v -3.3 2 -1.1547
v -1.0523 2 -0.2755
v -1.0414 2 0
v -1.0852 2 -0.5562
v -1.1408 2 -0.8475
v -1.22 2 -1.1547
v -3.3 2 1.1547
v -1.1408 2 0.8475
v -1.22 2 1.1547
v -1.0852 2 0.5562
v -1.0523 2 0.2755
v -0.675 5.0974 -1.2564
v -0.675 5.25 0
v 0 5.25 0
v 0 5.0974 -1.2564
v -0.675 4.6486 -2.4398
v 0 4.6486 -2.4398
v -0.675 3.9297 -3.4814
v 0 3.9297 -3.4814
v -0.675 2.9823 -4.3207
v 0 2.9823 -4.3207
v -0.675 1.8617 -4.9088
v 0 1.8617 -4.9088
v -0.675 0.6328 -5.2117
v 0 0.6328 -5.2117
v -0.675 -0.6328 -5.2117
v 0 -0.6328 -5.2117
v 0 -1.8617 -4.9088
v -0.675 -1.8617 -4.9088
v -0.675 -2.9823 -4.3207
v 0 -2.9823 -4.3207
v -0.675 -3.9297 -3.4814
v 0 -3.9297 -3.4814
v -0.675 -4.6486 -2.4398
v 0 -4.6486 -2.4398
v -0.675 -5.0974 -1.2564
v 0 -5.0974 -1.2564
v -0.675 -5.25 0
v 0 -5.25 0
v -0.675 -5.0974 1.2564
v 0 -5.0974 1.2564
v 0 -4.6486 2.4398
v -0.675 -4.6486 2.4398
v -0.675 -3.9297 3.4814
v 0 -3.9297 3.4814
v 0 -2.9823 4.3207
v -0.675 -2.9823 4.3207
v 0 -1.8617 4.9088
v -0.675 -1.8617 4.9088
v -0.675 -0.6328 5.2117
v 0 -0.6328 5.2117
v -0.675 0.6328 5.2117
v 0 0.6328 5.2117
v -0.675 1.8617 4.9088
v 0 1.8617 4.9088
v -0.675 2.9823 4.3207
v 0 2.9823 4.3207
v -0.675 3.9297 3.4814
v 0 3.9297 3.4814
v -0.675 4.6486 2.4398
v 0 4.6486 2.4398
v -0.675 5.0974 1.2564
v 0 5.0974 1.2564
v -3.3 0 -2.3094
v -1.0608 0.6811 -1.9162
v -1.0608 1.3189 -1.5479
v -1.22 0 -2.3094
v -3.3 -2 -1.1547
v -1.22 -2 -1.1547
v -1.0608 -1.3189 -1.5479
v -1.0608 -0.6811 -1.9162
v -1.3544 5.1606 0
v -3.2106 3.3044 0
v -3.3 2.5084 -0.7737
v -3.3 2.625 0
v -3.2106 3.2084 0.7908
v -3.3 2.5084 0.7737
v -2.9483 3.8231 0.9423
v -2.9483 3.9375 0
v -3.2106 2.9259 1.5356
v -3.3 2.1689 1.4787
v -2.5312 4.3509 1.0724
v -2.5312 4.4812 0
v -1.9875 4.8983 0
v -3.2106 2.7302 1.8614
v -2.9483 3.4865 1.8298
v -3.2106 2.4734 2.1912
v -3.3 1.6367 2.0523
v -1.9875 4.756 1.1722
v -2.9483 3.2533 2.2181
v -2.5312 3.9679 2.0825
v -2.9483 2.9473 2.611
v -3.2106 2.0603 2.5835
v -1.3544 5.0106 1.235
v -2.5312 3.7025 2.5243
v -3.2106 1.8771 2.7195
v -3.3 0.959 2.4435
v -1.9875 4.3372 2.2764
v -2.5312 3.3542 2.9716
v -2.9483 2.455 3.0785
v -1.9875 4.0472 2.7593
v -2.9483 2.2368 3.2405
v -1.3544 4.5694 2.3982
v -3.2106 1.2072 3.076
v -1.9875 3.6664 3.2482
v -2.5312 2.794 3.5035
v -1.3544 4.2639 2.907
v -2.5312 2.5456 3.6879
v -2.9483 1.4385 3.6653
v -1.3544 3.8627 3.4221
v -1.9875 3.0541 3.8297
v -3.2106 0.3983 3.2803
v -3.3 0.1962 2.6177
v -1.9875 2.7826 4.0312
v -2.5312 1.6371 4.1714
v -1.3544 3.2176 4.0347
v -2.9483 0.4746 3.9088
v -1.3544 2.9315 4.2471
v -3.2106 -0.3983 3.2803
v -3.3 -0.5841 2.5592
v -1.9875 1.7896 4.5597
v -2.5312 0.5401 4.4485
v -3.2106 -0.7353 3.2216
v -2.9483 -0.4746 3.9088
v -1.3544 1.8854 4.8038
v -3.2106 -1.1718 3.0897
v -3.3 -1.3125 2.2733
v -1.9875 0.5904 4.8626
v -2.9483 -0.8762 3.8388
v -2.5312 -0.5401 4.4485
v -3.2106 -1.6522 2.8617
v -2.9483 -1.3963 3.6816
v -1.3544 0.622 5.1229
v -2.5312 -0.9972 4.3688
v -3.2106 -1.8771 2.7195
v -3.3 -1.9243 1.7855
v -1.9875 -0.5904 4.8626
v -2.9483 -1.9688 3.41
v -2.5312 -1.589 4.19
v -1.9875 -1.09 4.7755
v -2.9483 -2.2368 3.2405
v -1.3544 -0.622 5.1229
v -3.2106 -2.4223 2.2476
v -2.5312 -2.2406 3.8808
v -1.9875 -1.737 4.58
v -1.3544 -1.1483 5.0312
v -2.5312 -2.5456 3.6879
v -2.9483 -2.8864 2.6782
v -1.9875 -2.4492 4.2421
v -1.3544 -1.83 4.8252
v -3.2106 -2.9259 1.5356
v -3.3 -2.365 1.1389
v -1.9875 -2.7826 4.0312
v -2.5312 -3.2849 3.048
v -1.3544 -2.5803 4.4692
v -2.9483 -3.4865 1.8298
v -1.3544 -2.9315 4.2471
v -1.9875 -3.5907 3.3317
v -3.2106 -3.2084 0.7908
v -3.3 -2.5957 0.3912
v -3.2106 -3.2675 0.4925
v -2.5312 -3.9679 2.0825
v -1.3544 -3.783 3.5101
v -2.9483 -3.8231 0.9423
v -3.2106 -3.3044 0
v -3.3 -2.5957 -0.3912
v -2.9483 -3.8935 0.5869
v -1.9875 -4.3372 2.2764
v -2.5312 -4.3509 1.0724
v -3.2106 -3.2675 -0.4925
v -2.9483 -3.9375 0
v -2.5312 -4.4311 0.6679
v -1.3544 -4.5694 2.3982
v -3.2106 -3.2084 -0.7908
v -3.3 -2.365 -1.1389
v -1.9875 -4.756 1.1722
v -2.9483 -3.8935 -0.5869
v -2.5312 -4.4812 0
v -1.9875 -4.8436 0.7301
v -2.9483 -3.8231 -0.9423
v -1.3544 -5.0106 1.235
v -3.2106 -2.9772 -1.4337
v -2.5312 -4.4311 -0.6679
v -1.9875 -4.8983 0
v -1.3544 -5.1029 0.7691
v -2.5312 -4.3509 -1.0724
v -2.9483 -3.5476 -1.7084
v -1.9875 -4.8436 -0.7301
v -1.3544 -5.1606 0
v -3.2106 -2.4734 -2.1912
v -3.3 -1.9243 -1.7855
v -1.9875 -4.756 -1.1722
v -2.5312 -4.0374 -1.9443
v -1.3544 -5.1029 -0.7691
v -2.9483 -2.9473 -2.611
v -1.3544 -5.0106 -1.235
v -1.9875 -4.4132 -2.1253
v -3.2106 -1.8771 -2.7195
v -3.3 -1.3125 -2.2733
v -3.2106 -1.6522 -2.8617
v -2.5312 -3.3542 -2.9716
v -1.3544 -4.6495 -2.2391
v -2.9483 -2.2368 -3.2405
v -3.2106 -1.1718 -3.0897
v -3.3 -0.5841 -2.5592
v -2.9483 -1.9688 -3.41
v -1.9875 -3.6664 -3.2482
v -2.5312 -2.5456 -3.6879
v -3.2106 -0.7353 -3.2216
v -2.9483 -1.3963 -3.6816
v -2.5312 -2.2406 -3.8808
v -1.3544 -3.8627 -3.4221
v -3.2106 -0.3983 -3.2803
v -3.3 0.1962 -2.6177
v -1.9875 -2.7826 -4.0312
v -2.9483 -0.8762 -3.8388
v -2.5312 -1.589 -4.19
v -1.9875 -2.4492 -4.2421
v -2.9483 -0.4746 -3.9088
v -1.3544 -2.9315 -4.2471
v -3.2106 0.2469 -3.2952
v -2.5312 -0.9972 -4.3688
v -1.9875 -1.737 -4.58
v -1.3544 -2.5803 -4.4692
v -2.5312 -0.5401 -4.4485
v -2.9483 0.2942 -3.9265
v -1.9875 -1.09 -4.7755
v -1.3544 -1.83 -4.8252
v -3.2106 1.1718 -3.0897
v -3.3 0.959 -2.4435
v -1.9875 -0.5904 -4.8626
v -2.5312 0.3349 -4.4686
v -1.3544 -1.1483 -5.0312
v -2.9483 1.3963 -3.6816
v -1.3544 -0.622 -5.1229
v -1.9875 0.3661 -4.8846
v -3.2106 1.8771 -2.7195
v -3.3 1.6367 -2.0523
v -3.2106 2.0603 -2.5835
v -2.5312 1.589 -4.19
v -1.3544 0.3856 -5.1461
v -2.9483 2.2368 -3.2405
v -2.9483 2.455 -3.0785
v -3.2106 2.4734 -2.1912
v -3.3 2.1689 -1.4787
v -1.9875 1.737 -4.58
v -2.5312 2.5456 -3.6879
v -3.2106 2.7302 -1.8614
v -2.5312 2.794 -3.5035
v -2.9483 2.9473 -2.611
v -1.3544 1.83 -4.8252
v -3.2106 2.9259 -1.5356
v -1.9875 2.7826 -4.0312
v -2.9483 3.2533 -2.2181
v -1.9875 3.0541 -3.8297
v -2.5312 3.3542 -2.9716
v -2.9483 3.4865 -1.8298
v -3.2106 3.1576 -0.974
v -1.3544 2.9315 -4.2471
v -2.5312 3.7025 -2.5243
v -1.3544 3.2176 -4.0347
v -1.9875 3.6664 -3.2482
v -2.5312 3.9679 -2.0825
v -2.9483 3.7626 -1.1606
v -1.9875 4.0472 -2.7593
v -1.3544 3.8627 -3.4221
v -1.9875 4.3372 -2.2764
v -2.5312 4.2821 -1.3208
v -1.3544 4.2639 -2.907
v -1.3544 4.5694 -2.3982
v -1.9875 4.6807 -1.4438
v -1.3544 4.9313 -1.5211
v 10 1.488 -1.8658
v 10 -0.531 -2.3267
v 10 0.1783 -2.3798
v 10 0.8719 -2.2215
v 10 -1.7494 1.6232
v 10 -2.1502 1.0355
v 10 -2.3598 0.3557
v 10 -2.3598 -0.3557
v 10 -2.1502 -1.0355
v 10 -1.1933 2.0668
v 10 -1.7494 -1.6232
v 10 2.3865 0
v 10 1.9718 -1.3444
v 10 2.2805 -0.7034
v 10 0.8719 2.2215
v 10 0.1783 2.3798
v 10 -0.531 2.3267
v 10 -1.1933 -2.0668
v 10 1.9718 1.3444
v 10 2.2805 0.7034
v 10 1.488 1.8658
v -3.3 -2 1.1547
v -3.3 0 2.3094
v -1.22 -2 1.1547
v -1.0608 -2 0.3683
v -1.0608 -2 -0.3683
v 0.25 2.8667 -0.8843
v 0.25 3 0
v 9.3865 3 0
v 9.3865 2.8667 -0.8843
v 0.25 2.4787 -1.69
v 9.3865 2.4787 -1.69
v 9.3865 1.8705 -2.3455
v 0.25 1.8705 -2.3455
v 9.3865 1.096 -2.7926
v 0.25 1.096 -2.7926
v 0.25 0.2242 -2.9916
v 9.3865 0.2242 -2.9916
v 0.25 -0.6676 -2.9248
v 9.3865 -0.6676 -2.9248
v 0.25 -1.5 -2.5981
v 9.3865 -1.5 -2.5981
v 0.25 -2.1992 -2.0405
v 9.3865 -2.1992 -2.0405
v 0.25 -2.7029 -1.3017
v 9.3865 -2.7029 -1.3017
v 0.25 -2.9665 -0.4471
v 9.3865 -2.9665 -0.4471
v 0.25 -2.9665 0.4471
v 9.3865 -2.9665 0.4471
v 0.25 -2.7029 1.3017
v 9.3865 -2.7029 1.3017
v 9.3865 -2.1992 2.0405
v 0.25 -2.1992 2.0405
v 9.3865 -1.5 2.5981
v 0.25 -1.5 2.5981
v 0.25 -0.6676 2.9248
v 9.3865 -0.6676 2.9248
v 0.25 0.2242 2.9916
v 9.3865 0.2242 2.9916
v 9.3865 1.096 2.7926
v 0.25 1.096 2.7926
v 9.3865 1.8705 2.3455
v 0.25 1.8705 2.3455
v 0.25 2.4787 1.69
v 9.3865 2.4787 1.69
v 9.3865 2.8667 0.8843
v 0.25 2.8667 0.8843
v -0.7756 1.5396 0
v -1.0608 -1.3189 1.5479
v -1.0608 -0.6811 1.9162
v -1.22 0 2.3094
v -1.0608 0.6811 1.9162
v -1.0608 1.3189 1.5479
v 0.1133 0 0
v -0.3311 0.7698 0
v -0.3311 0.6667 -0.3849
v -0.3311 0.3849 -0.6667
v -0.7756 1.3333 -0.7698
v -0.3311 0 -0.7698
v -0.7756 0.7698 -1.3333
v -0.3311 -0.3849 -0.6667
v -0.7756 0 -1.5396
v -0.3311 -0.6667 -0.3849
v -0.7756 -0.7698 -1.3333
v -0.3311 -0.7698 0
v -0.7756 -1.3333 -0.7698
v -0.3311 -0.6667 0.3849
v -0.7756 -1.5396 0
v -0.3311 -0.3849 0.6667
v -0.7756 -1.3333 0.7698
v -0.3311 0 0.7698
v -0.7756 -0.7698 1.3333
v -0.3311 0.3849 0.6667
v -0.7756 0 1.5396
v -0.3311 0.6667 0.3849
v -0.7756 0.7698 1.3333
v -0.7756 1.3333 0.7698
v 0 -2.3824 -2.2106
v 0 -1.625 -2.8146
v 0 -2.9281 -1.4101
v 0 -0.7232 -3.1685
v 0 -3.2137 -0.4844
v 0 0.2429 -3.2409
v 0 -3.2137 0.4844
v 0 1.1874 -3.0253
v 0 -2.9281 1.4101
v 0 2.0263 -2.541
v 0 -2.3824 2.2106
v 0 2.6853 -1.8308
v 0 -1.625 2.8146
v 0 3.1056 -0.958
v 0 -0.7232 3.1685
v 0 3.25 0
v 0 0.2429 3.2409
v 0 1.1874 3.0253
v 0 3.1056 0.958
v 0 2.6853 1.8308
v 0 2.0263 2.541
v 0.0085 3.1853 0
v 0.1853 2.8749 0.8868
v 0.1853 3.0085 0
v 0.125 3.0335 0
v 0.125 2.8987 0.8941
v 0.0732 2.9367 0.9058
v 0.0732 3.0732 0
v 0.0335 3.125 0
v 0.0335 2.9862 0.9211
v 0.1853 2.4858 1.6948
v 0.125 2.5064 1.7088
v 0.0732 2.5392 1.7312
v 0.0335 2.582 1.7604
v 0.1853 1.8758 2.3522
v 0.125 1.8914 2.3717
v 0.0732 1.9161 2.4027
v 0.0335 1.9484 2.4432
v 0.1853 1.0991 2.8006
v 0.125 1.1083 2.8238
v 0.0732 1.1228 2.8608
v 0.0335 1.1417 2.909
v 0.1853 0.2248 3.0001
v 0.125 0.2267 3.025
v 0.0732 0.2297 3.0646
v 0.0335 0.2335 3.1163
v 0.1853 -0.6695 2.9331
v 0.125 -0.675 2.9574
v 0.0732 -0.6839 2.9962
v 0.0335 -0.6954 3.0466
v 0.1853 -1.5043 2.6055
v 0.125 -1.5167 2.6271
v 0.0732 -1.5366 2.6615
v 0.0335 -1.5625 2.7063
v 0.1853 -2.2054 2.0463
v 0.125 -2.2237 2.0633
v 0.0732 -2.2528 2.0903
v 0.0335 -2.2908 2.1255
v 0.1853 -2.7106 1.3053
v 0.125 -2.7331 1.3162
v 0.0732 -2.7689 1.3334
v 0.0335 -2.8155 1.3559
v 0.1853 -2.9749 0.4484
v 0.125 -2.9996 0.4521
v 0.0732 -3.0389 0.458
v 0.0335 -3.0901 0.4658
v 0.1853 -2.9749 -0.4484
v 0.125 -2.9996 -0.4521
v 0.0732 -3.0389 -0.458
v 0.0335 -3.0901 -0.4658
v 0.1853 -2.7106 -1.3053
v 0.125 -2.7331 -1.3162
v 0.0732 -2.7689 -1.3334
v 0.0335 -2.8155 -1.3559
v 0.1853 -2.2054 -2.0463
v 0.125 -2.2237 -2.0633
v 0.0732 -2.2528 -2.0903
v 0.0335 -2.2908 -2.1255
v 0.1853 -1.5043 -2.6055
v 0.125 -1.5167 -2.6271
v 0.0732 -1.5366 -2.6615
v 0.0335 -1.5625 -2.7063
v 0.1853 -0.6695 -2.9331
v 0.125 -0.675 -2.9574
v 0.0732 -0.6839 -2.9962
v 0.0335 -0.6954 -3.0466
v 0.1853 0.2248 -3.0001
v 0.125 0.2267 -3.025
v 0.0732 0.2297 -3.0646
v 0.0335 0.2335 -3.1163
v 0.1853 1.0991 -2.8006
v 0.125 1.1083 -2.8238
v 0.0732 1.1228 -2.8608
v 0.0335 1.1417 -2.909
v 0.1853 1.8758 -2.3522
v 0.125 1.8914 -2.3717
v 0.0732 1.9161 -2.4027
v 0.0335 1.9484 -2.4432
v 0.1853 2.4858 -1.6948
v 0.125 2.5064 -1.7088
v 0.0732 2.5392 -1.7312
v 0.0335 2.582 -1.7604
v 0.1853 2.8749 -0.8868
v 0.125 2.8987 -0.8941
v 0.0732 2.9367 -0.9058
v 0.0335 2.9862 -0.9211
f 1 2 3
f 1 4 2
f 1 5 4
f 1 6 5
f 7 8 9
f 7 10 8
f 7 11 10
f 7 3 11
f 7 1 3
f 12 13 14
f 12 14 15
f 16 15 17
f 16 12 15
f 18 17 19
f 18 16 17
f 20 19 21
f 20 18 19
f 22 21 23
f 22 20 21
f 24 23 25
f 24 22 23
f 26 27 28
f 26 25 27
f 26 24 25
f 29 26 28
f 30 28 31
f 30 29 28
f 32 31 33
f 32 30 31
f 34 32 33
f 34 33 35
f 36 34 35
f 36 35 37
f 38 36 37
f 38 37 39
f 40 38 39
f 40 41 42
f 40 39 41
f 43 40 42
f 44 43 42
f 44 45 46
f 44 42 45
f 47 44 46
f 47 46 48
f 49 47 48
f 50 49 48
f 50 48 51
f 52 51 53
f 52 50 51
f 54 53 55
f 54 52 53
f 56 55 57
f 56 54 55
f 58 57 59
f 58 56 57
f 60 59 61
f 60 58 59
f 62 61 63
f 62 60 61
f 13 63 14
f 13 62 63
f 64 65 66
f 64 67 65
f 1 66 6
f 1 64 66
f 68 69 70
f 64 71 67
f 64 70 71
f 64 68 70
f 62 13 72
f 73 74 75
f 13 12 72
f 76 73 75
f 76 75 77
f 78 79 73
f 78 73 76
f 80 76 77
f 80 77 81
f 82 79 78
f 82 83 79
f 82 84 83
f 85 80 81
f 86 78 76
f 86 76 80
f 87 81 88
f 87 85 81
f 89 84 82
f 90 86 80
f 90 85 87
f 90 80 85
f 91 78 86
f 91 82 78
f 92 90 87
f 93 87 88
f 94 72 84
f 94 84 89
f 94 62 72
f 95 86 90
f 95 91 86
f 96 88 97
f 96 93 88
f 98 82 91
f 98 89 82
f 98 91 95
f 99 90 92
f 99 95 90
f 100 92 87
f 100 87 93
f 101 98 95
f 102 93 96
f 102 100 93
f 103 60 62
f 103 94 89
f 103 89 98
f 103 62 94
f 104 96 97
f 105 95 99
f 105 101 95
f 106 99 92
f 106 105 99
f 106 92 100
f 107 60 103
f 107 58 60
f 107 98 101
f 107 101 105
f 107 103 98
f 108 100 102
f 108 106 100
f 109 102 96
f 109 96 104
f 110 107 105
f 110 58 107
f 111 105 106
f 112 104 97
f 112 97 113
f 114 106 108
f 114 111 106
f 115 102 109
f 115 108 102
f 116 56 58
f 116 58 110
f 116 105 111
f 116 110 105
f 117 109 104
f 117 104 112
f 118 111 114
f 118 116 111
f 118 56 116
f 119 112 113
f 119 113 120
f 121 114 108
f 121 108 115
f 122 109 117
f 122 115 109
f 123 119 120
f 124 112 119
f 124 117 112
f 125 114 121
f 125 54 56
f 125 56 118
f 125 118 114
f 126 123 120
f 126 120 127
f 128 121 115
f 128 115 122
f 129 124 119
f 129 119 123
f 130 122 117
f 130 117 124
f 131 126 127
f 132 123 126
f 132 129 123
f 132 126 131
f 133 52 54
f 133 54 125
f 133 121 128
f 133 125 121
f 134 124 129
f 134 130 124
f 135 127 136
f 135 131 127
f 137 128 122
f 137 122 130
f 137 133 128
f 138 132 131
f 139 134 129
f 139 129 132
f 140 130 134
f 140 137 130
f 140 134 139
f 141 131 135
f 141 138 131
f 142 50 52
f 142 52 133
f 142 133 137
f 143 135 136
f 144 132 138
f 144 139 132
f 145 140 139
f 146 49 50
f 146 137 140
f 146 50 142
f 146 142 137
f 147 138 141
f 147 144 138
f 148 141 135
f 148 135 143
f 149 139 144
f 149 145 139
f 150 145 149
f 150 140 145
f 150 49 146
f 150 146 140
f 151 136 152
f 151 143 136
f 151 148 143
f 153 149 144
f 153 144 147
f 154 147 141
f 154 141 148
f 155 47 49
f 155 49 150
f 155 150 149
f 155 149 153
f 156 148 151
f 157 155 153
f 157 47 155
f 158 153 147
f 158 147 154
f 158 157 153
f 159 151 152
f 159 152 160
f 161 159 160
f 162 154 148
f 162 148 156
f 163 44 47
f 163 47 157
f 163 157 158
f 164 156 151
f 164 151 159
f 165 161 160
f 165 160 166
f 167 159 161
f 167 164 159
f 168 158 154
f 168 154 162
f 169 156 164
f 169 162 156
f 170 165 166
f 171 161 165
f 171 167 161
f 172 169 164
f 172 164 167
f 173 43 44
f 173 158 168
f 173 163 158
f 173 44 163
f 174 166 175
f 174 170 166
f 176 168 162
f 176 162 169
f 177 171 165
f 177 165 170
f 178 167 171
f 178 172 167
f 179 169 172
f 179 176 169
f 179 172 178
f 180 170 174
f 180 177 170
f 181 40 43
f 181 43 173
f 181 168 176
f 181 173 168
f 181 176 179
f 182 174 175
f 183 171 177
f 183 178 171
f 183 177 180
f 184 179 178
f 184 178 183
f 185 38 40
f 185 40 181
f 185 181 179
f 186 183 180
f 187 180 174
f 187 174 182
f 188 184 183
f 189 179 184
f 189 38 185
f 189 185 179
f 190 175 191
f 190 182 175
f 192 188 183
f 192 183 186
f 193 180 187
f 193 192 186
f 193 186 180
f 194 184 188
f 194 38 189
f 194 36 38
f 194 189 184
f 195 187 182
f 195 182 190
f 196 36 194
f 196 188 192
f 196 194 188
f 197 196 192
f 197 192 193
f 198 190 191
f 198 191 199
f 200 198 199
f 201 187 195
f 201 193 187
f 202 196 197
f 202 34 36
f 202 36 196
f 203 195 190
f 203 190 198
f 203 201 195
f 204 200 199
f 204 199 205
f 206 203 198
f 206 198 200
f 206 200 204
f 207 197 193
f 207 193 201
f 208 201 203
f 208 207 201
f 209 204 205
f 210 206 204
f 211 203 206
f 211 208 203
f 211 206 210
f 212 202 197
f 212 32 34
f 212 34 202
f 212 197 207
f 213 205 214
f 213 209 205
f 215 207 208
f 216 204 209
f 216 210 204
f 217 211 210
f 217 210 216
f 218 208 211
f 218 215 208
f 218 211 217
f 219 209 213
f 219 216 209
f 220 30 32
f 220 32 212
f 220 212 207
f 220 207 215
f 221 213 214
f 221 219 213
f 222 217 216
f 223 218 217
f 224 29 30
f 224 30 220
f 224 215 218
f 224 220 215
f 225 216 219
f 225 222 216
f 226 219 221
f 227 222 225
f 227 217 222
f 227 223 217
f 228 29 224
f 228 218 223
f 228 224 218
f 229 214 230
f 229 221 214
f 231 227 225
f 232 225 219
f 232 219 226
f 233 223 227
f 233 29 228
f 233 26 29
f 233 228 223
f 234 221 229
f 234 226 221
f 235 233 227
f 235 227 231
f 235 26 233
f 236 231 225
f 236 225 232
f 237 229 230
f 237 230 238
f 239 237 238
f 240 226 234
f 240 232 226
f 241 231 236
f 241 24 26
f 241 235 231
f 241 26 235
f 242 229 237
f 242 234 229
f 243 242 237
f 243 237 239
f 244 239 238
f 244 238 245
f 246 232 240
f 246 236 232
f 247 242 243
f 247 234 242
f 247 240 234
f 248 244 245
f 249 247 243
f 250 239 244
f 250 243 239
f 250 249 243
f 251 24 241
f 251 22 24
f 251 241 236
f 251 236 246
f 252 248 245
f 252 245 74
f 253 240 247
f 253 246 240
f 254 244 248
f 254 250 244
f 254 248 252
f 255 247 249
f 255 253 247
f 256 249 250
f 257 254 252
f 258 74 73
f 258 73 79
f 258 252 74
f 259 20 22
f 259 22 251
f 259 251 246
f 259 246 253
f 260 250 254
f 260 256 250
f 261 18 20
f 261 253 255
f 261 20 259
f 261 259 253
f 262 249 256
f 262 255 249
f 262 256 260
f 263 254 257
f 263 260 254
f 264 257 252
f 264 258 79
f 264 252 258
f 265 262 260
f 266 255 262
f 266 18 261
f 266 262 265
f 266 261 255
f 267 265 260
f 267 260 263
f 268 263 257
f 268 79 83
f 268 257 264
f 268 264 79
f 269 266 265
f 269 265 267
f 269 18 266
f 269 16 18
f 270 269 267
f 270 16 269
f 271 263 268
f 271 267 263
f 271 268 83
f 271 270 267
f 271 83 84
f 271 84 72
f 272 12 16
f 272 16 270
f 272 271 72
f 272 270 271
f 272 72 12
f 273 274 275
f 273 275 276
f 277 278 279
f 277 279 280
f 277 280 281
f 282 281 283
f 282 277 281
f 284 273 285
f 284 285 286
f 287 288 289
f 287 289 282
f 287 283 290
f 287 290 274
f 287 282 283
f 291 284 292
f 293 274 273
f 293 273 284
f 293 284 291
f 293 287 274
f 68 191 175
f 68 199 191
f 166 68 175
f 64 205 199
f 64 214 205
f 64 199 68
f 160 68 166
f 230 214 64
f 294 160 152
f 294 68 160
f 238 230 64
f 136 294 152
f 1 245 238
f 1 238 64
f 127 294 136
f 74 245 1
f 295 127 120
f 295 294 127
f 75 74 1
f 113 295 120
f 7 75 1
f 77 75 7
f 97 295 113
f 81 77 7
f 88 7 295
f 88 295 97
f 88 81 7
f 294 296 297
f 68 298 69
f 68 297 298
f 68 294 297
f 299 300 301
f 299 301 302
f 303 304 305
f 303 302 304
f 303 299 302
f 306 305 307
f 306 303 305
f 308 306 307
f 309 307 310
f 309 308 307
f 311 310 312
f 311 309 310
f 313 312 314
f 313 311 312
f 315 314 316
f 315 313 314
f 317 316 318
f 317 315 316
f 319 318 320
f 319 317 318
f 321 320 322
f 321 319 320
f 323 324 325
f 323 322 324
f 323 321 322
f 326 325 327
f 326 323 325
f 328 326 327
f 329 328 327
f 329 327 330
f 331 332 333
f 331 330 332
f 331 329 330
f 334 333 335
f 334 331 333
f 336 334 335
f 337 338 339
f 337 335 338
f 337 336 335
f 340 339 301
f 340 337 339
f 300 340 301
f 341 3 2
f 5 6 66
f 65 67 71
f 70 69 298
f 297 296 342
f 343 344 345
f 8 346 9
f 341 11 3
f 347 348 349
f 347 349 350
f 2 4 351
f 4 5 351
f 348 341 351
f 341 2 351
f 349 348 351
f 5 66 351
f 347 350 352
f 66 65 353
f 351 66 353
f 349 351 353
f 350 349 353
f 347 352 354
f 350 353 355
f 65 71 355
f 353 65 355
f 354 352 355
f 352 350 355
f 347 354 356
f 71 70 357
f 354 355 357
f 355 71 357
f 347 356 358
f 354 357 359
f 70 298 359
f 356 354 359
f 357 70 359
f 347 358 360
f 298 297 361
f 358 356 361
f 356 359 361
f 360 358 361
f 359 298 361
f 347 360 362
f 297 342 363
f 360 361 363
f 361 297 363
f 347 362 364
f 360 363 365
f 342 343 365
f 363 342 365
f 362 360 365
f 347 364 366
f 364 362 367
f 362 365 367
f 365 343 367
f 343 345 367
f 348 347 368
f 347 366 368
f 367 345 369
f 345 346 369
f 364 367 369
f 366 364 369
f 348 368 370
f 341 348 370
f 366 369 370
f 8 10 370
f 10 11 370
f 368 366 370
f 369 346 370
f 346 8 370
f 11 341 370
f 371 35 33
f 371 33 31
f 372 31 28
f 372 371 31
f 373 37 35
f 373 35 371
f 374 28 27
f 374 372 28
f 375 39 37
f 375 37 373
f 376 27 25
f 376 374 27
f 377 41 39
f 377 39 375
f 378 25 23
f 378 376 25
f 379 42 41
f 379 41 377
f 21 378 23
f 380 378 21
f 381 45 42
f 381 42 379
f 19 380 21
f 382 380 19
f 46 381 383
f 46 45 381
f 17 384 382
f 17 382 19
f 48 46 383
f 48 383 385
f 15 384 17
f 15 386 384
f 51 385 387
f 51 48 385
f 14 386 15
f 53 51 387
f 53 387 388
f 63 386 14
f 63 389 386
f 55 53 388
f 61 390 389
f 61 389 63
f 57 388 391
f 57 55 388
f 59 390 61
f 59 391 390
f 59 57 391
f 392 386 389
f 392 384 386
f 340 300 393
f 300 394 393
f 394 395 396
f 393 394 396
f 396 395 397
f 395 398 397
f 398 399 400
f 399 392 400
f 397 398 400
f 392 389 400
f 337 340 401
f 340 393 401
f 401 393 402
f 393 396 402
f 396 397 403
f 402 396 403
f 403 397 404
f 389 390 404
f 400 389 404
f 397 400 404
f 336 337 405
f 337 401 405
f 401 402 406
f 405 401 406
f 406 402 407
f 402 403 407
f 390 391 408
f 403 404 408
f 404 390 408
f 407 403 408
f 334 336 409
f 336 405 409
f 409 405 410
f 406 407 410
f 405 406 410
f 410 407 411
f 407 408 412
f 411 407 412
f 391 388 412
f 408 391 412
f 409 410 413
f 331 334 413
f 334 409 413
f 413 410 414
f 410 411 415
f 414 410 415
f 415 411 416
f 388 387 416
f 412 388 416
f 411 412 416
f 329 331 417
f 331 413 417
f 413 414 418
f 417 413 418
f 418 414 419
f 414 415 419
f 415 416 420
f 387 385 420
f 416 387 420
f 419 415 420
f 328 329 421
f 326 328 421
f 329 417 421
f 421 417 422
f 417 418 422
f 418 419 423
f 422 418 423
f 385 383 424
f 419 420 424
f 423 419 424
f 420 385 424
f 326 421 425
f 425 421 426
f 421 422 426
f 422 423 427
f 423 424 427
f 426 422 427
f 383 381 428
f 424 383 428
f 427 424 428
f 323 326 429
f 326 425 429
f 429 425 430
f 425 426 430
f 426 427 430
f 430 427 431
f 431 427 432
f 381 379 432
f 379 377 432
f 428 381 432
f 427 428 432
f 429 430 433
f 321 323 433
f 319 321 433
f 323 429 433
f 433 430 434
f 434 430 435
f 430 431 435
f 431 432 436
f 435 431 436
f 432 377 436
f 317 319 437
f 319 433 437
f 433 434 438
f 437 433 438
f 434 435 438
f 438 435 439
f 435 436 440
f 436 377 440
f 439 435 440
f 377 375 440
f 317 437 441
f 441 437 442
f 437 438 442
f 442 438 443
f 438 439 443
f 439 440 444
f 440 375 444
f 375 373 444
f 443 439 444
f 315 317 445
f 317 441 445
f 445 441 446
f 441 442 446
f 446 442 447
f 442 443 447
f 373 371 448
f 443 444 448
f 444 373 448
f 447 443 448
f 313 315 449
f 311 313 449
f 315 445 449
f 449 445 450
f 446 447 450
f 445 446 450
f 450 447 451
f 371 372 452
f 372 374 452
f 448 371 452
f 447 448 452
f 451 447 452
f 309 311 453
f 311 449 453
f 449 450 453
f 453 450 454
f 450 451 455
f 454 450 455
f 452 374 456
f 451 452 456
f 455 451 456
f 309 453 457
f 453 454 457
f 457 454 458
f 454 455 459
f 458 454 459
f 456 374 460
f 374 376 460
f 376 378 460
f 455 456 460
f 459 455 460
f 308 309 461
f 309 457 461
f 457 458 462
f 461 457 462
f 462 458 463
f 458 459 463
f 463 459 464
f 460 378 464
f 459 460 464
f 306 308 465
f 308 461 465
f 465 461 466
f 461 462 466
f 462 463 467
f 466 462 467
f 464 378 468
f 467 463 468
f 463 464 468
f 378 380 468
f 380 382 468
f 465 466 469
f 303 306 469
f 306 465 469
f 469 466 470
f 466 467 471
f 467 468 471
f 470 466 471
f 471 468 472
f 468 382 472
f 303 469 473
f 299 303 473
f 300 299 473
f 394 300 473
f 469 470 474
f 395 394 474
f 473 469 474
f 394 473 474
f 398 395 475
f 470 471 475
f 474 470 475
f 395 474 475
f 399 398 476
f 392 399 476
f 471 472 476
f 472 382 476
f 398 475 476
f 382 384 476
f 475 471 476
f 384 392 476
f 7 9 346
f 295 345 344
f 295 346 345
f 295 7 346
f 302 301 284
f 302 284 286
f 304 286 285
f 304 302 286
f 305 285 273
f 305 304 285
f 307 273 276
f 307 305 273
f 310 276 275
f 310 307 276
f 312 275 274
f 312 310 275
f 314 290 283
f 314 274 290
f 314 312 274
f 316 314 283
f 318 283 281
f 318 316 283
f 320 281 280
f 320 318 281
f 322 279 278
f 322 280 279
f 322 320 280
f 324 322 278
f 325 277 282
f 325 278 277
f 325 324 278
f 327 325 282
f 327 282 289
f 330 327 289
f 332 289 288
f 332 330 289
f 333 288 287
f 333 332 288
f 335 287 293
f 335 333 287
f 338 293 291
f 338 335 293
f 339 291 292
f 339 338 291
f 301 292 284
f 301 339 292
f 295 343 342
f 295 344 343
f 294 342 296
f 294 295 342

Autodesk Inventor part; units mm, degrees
ref_plane "YZ Plane" through (0, 0, 0) normal (1, 0, 0) x (0, 1, 0)
ref_plane "XZ Plane" through (0, 0, 0) normal (0, 1, 0) x (-1, 0, 0)
sketch "Sketch1" plane through (0, 0, 0) normal (0, 0, 1) x (1, 0, 0)
  line L0 (0.1133, 0) -> (10, 0)
  line L1 (10, 0) -> (10, 3)
  line L2 (10, 3) -> (2, 3)
  line L3 (2, 3) -> (1.3865, 3)
  line L4 (1.3865, 3) -> (0, 3)
  line L5 (0, 3) -> (0, 5.25)
  line L6 (0, 5.25) -> (-3.3, 5.25)
  line L7 (-3.3, 5.25) -> (-3.3, 2.3094)
  line L8 (-3.3, 2.3094) -> (-1.22, 2.3094)
  line L9 (-1.22, 2.3094) -> (0.1133, 0)
  line L10 (-5.96, 0) -> (12.66, 0) projected
  line L11 (0, -1.05) -> (0, 6.3) projected
  line L12 (2, 3) -> (0, 3) construction
  dimension "d0" = 8
  dimension "d1" = 0.6135
  dimension "d2" = 3.3
  dimension "d3" = 2.08
  dimension "d4" = 60
  dimension "d5" = 6
  dimension "d6" = 6
  dimension "d7" = 4.6188
  dimension "d8" = 10.5
  dimension "d19" = 10
revolve "Body" add sketch "Sketch1" angle 360 about axis through (0.1133, 0, 0) along (1, 0, 0) contours L9 L11 L4 L3 L2 L1 L0 | L9 L8 L7 L6 L5 L11
sketch "Sketch2" plane through (-3.3, 0, 0) normal (-1, 0, 0) x (0, 0, 1)
  circle A0 centre (0, 0) radius 2.3094 projected
  line L0 (0, -7.35) -> (0, 7.35) projected
  line L1 (-7.35, 0) -> (7.35, 0) projected
  line L2 (2.3094, 0) -> (1.1547, -2)
  line L3 (1.1547, -2) -> (-1.1547, -2)
  line L4 (-1.1547, -2) -> (-2.3094, 0)
  line L5 (-2.3094, 0) -> (-1.1547, 2)
  line L6 (-1.1547, 2) -> (1.1547, 2)
  line L7 (1.1547, 2) -> (2.3094, 0)
extrude "Slot" add sketch "Sketch2" against normal up to next contours L7 A0 | A0 L2 | L6 L0 A0 | A0 L0 L3 | L0 L6 A0 | A0 L3 L0 | L4 A0 | A0 L5
fillet "Fillet1" radius 2.625 1 edges at (-3.3, -5.25, 0)
thread "Thread" size "M6x1" class "4g6g" standard "ANSI Metric M Profile" length 8
chamfer "Chamfer1" distance 0.6135 distance2 0.6135 1 edges at (10, -3, 0) measured on face at (10, 0.705, 0.3049)
fillet "Fillet2" radius 0.25 1 edges at (0, -3, 0)
ref_plane "Work Plane1" through (30, 0, 0) normal (0, -0.5, 0.866) x (1, 0, 0)
equation "\"d0\" = GEL"
equation "\"d1\" = GAL"
equation "\"d2\" = KOH"
equation "\"d3\" = INTI"
equation "\"d5\" = GD"
equation "\"d6\" = BDM"
equation "\"d7\" = 1.1547 * SW"
equation "\"d8\" = KOD"
equation "\"d19\" = NLG"
equation "\"d16\" = RR"
equation "\"d12\" = GEL"
equation "\"d14\" = -0.5 * SPD + 0.5 * GD"
equation "\"d15\" = GUL"
equation "\"d29\" = R"
equation "\"GD\" = NND"
equation "\"NLG\" = 10"
equation "\"GEL\" = 8"
equation "\"KOD\" = 10.5"
equation "\"KOH\" = 3.3"
equation "\"INTI\" = 2.08"
equation "\"GAL\" = 0.61345 * PTC"
equation "\"GUL\" = 0.61345 * PTC"
equation "\"BDM\" = NND"
equation "\"SW\" = 4"
equation "\"RR\" = 2.625"
equation "\"SPD\" = 4.7731"
equation "\"d28\" = R"
equation "\"R\" = 0.25"
equation "\"TOA\" = 30deg"
equation "\"THREADDIA\" = 6"
equation "\"KOD1\" = KOD - 2 * RR"
equation "\"PTC\" = 1"
equation "\"NND\" = 6"
equation "\"E0\" = 1.155 * SW"
equation "\"GD1\" = THREADDIA - 1.2269 * PTC"
properties part number "ANSI B18.3.4M - M6 x 1 x 10" material "Steel, Mild"
